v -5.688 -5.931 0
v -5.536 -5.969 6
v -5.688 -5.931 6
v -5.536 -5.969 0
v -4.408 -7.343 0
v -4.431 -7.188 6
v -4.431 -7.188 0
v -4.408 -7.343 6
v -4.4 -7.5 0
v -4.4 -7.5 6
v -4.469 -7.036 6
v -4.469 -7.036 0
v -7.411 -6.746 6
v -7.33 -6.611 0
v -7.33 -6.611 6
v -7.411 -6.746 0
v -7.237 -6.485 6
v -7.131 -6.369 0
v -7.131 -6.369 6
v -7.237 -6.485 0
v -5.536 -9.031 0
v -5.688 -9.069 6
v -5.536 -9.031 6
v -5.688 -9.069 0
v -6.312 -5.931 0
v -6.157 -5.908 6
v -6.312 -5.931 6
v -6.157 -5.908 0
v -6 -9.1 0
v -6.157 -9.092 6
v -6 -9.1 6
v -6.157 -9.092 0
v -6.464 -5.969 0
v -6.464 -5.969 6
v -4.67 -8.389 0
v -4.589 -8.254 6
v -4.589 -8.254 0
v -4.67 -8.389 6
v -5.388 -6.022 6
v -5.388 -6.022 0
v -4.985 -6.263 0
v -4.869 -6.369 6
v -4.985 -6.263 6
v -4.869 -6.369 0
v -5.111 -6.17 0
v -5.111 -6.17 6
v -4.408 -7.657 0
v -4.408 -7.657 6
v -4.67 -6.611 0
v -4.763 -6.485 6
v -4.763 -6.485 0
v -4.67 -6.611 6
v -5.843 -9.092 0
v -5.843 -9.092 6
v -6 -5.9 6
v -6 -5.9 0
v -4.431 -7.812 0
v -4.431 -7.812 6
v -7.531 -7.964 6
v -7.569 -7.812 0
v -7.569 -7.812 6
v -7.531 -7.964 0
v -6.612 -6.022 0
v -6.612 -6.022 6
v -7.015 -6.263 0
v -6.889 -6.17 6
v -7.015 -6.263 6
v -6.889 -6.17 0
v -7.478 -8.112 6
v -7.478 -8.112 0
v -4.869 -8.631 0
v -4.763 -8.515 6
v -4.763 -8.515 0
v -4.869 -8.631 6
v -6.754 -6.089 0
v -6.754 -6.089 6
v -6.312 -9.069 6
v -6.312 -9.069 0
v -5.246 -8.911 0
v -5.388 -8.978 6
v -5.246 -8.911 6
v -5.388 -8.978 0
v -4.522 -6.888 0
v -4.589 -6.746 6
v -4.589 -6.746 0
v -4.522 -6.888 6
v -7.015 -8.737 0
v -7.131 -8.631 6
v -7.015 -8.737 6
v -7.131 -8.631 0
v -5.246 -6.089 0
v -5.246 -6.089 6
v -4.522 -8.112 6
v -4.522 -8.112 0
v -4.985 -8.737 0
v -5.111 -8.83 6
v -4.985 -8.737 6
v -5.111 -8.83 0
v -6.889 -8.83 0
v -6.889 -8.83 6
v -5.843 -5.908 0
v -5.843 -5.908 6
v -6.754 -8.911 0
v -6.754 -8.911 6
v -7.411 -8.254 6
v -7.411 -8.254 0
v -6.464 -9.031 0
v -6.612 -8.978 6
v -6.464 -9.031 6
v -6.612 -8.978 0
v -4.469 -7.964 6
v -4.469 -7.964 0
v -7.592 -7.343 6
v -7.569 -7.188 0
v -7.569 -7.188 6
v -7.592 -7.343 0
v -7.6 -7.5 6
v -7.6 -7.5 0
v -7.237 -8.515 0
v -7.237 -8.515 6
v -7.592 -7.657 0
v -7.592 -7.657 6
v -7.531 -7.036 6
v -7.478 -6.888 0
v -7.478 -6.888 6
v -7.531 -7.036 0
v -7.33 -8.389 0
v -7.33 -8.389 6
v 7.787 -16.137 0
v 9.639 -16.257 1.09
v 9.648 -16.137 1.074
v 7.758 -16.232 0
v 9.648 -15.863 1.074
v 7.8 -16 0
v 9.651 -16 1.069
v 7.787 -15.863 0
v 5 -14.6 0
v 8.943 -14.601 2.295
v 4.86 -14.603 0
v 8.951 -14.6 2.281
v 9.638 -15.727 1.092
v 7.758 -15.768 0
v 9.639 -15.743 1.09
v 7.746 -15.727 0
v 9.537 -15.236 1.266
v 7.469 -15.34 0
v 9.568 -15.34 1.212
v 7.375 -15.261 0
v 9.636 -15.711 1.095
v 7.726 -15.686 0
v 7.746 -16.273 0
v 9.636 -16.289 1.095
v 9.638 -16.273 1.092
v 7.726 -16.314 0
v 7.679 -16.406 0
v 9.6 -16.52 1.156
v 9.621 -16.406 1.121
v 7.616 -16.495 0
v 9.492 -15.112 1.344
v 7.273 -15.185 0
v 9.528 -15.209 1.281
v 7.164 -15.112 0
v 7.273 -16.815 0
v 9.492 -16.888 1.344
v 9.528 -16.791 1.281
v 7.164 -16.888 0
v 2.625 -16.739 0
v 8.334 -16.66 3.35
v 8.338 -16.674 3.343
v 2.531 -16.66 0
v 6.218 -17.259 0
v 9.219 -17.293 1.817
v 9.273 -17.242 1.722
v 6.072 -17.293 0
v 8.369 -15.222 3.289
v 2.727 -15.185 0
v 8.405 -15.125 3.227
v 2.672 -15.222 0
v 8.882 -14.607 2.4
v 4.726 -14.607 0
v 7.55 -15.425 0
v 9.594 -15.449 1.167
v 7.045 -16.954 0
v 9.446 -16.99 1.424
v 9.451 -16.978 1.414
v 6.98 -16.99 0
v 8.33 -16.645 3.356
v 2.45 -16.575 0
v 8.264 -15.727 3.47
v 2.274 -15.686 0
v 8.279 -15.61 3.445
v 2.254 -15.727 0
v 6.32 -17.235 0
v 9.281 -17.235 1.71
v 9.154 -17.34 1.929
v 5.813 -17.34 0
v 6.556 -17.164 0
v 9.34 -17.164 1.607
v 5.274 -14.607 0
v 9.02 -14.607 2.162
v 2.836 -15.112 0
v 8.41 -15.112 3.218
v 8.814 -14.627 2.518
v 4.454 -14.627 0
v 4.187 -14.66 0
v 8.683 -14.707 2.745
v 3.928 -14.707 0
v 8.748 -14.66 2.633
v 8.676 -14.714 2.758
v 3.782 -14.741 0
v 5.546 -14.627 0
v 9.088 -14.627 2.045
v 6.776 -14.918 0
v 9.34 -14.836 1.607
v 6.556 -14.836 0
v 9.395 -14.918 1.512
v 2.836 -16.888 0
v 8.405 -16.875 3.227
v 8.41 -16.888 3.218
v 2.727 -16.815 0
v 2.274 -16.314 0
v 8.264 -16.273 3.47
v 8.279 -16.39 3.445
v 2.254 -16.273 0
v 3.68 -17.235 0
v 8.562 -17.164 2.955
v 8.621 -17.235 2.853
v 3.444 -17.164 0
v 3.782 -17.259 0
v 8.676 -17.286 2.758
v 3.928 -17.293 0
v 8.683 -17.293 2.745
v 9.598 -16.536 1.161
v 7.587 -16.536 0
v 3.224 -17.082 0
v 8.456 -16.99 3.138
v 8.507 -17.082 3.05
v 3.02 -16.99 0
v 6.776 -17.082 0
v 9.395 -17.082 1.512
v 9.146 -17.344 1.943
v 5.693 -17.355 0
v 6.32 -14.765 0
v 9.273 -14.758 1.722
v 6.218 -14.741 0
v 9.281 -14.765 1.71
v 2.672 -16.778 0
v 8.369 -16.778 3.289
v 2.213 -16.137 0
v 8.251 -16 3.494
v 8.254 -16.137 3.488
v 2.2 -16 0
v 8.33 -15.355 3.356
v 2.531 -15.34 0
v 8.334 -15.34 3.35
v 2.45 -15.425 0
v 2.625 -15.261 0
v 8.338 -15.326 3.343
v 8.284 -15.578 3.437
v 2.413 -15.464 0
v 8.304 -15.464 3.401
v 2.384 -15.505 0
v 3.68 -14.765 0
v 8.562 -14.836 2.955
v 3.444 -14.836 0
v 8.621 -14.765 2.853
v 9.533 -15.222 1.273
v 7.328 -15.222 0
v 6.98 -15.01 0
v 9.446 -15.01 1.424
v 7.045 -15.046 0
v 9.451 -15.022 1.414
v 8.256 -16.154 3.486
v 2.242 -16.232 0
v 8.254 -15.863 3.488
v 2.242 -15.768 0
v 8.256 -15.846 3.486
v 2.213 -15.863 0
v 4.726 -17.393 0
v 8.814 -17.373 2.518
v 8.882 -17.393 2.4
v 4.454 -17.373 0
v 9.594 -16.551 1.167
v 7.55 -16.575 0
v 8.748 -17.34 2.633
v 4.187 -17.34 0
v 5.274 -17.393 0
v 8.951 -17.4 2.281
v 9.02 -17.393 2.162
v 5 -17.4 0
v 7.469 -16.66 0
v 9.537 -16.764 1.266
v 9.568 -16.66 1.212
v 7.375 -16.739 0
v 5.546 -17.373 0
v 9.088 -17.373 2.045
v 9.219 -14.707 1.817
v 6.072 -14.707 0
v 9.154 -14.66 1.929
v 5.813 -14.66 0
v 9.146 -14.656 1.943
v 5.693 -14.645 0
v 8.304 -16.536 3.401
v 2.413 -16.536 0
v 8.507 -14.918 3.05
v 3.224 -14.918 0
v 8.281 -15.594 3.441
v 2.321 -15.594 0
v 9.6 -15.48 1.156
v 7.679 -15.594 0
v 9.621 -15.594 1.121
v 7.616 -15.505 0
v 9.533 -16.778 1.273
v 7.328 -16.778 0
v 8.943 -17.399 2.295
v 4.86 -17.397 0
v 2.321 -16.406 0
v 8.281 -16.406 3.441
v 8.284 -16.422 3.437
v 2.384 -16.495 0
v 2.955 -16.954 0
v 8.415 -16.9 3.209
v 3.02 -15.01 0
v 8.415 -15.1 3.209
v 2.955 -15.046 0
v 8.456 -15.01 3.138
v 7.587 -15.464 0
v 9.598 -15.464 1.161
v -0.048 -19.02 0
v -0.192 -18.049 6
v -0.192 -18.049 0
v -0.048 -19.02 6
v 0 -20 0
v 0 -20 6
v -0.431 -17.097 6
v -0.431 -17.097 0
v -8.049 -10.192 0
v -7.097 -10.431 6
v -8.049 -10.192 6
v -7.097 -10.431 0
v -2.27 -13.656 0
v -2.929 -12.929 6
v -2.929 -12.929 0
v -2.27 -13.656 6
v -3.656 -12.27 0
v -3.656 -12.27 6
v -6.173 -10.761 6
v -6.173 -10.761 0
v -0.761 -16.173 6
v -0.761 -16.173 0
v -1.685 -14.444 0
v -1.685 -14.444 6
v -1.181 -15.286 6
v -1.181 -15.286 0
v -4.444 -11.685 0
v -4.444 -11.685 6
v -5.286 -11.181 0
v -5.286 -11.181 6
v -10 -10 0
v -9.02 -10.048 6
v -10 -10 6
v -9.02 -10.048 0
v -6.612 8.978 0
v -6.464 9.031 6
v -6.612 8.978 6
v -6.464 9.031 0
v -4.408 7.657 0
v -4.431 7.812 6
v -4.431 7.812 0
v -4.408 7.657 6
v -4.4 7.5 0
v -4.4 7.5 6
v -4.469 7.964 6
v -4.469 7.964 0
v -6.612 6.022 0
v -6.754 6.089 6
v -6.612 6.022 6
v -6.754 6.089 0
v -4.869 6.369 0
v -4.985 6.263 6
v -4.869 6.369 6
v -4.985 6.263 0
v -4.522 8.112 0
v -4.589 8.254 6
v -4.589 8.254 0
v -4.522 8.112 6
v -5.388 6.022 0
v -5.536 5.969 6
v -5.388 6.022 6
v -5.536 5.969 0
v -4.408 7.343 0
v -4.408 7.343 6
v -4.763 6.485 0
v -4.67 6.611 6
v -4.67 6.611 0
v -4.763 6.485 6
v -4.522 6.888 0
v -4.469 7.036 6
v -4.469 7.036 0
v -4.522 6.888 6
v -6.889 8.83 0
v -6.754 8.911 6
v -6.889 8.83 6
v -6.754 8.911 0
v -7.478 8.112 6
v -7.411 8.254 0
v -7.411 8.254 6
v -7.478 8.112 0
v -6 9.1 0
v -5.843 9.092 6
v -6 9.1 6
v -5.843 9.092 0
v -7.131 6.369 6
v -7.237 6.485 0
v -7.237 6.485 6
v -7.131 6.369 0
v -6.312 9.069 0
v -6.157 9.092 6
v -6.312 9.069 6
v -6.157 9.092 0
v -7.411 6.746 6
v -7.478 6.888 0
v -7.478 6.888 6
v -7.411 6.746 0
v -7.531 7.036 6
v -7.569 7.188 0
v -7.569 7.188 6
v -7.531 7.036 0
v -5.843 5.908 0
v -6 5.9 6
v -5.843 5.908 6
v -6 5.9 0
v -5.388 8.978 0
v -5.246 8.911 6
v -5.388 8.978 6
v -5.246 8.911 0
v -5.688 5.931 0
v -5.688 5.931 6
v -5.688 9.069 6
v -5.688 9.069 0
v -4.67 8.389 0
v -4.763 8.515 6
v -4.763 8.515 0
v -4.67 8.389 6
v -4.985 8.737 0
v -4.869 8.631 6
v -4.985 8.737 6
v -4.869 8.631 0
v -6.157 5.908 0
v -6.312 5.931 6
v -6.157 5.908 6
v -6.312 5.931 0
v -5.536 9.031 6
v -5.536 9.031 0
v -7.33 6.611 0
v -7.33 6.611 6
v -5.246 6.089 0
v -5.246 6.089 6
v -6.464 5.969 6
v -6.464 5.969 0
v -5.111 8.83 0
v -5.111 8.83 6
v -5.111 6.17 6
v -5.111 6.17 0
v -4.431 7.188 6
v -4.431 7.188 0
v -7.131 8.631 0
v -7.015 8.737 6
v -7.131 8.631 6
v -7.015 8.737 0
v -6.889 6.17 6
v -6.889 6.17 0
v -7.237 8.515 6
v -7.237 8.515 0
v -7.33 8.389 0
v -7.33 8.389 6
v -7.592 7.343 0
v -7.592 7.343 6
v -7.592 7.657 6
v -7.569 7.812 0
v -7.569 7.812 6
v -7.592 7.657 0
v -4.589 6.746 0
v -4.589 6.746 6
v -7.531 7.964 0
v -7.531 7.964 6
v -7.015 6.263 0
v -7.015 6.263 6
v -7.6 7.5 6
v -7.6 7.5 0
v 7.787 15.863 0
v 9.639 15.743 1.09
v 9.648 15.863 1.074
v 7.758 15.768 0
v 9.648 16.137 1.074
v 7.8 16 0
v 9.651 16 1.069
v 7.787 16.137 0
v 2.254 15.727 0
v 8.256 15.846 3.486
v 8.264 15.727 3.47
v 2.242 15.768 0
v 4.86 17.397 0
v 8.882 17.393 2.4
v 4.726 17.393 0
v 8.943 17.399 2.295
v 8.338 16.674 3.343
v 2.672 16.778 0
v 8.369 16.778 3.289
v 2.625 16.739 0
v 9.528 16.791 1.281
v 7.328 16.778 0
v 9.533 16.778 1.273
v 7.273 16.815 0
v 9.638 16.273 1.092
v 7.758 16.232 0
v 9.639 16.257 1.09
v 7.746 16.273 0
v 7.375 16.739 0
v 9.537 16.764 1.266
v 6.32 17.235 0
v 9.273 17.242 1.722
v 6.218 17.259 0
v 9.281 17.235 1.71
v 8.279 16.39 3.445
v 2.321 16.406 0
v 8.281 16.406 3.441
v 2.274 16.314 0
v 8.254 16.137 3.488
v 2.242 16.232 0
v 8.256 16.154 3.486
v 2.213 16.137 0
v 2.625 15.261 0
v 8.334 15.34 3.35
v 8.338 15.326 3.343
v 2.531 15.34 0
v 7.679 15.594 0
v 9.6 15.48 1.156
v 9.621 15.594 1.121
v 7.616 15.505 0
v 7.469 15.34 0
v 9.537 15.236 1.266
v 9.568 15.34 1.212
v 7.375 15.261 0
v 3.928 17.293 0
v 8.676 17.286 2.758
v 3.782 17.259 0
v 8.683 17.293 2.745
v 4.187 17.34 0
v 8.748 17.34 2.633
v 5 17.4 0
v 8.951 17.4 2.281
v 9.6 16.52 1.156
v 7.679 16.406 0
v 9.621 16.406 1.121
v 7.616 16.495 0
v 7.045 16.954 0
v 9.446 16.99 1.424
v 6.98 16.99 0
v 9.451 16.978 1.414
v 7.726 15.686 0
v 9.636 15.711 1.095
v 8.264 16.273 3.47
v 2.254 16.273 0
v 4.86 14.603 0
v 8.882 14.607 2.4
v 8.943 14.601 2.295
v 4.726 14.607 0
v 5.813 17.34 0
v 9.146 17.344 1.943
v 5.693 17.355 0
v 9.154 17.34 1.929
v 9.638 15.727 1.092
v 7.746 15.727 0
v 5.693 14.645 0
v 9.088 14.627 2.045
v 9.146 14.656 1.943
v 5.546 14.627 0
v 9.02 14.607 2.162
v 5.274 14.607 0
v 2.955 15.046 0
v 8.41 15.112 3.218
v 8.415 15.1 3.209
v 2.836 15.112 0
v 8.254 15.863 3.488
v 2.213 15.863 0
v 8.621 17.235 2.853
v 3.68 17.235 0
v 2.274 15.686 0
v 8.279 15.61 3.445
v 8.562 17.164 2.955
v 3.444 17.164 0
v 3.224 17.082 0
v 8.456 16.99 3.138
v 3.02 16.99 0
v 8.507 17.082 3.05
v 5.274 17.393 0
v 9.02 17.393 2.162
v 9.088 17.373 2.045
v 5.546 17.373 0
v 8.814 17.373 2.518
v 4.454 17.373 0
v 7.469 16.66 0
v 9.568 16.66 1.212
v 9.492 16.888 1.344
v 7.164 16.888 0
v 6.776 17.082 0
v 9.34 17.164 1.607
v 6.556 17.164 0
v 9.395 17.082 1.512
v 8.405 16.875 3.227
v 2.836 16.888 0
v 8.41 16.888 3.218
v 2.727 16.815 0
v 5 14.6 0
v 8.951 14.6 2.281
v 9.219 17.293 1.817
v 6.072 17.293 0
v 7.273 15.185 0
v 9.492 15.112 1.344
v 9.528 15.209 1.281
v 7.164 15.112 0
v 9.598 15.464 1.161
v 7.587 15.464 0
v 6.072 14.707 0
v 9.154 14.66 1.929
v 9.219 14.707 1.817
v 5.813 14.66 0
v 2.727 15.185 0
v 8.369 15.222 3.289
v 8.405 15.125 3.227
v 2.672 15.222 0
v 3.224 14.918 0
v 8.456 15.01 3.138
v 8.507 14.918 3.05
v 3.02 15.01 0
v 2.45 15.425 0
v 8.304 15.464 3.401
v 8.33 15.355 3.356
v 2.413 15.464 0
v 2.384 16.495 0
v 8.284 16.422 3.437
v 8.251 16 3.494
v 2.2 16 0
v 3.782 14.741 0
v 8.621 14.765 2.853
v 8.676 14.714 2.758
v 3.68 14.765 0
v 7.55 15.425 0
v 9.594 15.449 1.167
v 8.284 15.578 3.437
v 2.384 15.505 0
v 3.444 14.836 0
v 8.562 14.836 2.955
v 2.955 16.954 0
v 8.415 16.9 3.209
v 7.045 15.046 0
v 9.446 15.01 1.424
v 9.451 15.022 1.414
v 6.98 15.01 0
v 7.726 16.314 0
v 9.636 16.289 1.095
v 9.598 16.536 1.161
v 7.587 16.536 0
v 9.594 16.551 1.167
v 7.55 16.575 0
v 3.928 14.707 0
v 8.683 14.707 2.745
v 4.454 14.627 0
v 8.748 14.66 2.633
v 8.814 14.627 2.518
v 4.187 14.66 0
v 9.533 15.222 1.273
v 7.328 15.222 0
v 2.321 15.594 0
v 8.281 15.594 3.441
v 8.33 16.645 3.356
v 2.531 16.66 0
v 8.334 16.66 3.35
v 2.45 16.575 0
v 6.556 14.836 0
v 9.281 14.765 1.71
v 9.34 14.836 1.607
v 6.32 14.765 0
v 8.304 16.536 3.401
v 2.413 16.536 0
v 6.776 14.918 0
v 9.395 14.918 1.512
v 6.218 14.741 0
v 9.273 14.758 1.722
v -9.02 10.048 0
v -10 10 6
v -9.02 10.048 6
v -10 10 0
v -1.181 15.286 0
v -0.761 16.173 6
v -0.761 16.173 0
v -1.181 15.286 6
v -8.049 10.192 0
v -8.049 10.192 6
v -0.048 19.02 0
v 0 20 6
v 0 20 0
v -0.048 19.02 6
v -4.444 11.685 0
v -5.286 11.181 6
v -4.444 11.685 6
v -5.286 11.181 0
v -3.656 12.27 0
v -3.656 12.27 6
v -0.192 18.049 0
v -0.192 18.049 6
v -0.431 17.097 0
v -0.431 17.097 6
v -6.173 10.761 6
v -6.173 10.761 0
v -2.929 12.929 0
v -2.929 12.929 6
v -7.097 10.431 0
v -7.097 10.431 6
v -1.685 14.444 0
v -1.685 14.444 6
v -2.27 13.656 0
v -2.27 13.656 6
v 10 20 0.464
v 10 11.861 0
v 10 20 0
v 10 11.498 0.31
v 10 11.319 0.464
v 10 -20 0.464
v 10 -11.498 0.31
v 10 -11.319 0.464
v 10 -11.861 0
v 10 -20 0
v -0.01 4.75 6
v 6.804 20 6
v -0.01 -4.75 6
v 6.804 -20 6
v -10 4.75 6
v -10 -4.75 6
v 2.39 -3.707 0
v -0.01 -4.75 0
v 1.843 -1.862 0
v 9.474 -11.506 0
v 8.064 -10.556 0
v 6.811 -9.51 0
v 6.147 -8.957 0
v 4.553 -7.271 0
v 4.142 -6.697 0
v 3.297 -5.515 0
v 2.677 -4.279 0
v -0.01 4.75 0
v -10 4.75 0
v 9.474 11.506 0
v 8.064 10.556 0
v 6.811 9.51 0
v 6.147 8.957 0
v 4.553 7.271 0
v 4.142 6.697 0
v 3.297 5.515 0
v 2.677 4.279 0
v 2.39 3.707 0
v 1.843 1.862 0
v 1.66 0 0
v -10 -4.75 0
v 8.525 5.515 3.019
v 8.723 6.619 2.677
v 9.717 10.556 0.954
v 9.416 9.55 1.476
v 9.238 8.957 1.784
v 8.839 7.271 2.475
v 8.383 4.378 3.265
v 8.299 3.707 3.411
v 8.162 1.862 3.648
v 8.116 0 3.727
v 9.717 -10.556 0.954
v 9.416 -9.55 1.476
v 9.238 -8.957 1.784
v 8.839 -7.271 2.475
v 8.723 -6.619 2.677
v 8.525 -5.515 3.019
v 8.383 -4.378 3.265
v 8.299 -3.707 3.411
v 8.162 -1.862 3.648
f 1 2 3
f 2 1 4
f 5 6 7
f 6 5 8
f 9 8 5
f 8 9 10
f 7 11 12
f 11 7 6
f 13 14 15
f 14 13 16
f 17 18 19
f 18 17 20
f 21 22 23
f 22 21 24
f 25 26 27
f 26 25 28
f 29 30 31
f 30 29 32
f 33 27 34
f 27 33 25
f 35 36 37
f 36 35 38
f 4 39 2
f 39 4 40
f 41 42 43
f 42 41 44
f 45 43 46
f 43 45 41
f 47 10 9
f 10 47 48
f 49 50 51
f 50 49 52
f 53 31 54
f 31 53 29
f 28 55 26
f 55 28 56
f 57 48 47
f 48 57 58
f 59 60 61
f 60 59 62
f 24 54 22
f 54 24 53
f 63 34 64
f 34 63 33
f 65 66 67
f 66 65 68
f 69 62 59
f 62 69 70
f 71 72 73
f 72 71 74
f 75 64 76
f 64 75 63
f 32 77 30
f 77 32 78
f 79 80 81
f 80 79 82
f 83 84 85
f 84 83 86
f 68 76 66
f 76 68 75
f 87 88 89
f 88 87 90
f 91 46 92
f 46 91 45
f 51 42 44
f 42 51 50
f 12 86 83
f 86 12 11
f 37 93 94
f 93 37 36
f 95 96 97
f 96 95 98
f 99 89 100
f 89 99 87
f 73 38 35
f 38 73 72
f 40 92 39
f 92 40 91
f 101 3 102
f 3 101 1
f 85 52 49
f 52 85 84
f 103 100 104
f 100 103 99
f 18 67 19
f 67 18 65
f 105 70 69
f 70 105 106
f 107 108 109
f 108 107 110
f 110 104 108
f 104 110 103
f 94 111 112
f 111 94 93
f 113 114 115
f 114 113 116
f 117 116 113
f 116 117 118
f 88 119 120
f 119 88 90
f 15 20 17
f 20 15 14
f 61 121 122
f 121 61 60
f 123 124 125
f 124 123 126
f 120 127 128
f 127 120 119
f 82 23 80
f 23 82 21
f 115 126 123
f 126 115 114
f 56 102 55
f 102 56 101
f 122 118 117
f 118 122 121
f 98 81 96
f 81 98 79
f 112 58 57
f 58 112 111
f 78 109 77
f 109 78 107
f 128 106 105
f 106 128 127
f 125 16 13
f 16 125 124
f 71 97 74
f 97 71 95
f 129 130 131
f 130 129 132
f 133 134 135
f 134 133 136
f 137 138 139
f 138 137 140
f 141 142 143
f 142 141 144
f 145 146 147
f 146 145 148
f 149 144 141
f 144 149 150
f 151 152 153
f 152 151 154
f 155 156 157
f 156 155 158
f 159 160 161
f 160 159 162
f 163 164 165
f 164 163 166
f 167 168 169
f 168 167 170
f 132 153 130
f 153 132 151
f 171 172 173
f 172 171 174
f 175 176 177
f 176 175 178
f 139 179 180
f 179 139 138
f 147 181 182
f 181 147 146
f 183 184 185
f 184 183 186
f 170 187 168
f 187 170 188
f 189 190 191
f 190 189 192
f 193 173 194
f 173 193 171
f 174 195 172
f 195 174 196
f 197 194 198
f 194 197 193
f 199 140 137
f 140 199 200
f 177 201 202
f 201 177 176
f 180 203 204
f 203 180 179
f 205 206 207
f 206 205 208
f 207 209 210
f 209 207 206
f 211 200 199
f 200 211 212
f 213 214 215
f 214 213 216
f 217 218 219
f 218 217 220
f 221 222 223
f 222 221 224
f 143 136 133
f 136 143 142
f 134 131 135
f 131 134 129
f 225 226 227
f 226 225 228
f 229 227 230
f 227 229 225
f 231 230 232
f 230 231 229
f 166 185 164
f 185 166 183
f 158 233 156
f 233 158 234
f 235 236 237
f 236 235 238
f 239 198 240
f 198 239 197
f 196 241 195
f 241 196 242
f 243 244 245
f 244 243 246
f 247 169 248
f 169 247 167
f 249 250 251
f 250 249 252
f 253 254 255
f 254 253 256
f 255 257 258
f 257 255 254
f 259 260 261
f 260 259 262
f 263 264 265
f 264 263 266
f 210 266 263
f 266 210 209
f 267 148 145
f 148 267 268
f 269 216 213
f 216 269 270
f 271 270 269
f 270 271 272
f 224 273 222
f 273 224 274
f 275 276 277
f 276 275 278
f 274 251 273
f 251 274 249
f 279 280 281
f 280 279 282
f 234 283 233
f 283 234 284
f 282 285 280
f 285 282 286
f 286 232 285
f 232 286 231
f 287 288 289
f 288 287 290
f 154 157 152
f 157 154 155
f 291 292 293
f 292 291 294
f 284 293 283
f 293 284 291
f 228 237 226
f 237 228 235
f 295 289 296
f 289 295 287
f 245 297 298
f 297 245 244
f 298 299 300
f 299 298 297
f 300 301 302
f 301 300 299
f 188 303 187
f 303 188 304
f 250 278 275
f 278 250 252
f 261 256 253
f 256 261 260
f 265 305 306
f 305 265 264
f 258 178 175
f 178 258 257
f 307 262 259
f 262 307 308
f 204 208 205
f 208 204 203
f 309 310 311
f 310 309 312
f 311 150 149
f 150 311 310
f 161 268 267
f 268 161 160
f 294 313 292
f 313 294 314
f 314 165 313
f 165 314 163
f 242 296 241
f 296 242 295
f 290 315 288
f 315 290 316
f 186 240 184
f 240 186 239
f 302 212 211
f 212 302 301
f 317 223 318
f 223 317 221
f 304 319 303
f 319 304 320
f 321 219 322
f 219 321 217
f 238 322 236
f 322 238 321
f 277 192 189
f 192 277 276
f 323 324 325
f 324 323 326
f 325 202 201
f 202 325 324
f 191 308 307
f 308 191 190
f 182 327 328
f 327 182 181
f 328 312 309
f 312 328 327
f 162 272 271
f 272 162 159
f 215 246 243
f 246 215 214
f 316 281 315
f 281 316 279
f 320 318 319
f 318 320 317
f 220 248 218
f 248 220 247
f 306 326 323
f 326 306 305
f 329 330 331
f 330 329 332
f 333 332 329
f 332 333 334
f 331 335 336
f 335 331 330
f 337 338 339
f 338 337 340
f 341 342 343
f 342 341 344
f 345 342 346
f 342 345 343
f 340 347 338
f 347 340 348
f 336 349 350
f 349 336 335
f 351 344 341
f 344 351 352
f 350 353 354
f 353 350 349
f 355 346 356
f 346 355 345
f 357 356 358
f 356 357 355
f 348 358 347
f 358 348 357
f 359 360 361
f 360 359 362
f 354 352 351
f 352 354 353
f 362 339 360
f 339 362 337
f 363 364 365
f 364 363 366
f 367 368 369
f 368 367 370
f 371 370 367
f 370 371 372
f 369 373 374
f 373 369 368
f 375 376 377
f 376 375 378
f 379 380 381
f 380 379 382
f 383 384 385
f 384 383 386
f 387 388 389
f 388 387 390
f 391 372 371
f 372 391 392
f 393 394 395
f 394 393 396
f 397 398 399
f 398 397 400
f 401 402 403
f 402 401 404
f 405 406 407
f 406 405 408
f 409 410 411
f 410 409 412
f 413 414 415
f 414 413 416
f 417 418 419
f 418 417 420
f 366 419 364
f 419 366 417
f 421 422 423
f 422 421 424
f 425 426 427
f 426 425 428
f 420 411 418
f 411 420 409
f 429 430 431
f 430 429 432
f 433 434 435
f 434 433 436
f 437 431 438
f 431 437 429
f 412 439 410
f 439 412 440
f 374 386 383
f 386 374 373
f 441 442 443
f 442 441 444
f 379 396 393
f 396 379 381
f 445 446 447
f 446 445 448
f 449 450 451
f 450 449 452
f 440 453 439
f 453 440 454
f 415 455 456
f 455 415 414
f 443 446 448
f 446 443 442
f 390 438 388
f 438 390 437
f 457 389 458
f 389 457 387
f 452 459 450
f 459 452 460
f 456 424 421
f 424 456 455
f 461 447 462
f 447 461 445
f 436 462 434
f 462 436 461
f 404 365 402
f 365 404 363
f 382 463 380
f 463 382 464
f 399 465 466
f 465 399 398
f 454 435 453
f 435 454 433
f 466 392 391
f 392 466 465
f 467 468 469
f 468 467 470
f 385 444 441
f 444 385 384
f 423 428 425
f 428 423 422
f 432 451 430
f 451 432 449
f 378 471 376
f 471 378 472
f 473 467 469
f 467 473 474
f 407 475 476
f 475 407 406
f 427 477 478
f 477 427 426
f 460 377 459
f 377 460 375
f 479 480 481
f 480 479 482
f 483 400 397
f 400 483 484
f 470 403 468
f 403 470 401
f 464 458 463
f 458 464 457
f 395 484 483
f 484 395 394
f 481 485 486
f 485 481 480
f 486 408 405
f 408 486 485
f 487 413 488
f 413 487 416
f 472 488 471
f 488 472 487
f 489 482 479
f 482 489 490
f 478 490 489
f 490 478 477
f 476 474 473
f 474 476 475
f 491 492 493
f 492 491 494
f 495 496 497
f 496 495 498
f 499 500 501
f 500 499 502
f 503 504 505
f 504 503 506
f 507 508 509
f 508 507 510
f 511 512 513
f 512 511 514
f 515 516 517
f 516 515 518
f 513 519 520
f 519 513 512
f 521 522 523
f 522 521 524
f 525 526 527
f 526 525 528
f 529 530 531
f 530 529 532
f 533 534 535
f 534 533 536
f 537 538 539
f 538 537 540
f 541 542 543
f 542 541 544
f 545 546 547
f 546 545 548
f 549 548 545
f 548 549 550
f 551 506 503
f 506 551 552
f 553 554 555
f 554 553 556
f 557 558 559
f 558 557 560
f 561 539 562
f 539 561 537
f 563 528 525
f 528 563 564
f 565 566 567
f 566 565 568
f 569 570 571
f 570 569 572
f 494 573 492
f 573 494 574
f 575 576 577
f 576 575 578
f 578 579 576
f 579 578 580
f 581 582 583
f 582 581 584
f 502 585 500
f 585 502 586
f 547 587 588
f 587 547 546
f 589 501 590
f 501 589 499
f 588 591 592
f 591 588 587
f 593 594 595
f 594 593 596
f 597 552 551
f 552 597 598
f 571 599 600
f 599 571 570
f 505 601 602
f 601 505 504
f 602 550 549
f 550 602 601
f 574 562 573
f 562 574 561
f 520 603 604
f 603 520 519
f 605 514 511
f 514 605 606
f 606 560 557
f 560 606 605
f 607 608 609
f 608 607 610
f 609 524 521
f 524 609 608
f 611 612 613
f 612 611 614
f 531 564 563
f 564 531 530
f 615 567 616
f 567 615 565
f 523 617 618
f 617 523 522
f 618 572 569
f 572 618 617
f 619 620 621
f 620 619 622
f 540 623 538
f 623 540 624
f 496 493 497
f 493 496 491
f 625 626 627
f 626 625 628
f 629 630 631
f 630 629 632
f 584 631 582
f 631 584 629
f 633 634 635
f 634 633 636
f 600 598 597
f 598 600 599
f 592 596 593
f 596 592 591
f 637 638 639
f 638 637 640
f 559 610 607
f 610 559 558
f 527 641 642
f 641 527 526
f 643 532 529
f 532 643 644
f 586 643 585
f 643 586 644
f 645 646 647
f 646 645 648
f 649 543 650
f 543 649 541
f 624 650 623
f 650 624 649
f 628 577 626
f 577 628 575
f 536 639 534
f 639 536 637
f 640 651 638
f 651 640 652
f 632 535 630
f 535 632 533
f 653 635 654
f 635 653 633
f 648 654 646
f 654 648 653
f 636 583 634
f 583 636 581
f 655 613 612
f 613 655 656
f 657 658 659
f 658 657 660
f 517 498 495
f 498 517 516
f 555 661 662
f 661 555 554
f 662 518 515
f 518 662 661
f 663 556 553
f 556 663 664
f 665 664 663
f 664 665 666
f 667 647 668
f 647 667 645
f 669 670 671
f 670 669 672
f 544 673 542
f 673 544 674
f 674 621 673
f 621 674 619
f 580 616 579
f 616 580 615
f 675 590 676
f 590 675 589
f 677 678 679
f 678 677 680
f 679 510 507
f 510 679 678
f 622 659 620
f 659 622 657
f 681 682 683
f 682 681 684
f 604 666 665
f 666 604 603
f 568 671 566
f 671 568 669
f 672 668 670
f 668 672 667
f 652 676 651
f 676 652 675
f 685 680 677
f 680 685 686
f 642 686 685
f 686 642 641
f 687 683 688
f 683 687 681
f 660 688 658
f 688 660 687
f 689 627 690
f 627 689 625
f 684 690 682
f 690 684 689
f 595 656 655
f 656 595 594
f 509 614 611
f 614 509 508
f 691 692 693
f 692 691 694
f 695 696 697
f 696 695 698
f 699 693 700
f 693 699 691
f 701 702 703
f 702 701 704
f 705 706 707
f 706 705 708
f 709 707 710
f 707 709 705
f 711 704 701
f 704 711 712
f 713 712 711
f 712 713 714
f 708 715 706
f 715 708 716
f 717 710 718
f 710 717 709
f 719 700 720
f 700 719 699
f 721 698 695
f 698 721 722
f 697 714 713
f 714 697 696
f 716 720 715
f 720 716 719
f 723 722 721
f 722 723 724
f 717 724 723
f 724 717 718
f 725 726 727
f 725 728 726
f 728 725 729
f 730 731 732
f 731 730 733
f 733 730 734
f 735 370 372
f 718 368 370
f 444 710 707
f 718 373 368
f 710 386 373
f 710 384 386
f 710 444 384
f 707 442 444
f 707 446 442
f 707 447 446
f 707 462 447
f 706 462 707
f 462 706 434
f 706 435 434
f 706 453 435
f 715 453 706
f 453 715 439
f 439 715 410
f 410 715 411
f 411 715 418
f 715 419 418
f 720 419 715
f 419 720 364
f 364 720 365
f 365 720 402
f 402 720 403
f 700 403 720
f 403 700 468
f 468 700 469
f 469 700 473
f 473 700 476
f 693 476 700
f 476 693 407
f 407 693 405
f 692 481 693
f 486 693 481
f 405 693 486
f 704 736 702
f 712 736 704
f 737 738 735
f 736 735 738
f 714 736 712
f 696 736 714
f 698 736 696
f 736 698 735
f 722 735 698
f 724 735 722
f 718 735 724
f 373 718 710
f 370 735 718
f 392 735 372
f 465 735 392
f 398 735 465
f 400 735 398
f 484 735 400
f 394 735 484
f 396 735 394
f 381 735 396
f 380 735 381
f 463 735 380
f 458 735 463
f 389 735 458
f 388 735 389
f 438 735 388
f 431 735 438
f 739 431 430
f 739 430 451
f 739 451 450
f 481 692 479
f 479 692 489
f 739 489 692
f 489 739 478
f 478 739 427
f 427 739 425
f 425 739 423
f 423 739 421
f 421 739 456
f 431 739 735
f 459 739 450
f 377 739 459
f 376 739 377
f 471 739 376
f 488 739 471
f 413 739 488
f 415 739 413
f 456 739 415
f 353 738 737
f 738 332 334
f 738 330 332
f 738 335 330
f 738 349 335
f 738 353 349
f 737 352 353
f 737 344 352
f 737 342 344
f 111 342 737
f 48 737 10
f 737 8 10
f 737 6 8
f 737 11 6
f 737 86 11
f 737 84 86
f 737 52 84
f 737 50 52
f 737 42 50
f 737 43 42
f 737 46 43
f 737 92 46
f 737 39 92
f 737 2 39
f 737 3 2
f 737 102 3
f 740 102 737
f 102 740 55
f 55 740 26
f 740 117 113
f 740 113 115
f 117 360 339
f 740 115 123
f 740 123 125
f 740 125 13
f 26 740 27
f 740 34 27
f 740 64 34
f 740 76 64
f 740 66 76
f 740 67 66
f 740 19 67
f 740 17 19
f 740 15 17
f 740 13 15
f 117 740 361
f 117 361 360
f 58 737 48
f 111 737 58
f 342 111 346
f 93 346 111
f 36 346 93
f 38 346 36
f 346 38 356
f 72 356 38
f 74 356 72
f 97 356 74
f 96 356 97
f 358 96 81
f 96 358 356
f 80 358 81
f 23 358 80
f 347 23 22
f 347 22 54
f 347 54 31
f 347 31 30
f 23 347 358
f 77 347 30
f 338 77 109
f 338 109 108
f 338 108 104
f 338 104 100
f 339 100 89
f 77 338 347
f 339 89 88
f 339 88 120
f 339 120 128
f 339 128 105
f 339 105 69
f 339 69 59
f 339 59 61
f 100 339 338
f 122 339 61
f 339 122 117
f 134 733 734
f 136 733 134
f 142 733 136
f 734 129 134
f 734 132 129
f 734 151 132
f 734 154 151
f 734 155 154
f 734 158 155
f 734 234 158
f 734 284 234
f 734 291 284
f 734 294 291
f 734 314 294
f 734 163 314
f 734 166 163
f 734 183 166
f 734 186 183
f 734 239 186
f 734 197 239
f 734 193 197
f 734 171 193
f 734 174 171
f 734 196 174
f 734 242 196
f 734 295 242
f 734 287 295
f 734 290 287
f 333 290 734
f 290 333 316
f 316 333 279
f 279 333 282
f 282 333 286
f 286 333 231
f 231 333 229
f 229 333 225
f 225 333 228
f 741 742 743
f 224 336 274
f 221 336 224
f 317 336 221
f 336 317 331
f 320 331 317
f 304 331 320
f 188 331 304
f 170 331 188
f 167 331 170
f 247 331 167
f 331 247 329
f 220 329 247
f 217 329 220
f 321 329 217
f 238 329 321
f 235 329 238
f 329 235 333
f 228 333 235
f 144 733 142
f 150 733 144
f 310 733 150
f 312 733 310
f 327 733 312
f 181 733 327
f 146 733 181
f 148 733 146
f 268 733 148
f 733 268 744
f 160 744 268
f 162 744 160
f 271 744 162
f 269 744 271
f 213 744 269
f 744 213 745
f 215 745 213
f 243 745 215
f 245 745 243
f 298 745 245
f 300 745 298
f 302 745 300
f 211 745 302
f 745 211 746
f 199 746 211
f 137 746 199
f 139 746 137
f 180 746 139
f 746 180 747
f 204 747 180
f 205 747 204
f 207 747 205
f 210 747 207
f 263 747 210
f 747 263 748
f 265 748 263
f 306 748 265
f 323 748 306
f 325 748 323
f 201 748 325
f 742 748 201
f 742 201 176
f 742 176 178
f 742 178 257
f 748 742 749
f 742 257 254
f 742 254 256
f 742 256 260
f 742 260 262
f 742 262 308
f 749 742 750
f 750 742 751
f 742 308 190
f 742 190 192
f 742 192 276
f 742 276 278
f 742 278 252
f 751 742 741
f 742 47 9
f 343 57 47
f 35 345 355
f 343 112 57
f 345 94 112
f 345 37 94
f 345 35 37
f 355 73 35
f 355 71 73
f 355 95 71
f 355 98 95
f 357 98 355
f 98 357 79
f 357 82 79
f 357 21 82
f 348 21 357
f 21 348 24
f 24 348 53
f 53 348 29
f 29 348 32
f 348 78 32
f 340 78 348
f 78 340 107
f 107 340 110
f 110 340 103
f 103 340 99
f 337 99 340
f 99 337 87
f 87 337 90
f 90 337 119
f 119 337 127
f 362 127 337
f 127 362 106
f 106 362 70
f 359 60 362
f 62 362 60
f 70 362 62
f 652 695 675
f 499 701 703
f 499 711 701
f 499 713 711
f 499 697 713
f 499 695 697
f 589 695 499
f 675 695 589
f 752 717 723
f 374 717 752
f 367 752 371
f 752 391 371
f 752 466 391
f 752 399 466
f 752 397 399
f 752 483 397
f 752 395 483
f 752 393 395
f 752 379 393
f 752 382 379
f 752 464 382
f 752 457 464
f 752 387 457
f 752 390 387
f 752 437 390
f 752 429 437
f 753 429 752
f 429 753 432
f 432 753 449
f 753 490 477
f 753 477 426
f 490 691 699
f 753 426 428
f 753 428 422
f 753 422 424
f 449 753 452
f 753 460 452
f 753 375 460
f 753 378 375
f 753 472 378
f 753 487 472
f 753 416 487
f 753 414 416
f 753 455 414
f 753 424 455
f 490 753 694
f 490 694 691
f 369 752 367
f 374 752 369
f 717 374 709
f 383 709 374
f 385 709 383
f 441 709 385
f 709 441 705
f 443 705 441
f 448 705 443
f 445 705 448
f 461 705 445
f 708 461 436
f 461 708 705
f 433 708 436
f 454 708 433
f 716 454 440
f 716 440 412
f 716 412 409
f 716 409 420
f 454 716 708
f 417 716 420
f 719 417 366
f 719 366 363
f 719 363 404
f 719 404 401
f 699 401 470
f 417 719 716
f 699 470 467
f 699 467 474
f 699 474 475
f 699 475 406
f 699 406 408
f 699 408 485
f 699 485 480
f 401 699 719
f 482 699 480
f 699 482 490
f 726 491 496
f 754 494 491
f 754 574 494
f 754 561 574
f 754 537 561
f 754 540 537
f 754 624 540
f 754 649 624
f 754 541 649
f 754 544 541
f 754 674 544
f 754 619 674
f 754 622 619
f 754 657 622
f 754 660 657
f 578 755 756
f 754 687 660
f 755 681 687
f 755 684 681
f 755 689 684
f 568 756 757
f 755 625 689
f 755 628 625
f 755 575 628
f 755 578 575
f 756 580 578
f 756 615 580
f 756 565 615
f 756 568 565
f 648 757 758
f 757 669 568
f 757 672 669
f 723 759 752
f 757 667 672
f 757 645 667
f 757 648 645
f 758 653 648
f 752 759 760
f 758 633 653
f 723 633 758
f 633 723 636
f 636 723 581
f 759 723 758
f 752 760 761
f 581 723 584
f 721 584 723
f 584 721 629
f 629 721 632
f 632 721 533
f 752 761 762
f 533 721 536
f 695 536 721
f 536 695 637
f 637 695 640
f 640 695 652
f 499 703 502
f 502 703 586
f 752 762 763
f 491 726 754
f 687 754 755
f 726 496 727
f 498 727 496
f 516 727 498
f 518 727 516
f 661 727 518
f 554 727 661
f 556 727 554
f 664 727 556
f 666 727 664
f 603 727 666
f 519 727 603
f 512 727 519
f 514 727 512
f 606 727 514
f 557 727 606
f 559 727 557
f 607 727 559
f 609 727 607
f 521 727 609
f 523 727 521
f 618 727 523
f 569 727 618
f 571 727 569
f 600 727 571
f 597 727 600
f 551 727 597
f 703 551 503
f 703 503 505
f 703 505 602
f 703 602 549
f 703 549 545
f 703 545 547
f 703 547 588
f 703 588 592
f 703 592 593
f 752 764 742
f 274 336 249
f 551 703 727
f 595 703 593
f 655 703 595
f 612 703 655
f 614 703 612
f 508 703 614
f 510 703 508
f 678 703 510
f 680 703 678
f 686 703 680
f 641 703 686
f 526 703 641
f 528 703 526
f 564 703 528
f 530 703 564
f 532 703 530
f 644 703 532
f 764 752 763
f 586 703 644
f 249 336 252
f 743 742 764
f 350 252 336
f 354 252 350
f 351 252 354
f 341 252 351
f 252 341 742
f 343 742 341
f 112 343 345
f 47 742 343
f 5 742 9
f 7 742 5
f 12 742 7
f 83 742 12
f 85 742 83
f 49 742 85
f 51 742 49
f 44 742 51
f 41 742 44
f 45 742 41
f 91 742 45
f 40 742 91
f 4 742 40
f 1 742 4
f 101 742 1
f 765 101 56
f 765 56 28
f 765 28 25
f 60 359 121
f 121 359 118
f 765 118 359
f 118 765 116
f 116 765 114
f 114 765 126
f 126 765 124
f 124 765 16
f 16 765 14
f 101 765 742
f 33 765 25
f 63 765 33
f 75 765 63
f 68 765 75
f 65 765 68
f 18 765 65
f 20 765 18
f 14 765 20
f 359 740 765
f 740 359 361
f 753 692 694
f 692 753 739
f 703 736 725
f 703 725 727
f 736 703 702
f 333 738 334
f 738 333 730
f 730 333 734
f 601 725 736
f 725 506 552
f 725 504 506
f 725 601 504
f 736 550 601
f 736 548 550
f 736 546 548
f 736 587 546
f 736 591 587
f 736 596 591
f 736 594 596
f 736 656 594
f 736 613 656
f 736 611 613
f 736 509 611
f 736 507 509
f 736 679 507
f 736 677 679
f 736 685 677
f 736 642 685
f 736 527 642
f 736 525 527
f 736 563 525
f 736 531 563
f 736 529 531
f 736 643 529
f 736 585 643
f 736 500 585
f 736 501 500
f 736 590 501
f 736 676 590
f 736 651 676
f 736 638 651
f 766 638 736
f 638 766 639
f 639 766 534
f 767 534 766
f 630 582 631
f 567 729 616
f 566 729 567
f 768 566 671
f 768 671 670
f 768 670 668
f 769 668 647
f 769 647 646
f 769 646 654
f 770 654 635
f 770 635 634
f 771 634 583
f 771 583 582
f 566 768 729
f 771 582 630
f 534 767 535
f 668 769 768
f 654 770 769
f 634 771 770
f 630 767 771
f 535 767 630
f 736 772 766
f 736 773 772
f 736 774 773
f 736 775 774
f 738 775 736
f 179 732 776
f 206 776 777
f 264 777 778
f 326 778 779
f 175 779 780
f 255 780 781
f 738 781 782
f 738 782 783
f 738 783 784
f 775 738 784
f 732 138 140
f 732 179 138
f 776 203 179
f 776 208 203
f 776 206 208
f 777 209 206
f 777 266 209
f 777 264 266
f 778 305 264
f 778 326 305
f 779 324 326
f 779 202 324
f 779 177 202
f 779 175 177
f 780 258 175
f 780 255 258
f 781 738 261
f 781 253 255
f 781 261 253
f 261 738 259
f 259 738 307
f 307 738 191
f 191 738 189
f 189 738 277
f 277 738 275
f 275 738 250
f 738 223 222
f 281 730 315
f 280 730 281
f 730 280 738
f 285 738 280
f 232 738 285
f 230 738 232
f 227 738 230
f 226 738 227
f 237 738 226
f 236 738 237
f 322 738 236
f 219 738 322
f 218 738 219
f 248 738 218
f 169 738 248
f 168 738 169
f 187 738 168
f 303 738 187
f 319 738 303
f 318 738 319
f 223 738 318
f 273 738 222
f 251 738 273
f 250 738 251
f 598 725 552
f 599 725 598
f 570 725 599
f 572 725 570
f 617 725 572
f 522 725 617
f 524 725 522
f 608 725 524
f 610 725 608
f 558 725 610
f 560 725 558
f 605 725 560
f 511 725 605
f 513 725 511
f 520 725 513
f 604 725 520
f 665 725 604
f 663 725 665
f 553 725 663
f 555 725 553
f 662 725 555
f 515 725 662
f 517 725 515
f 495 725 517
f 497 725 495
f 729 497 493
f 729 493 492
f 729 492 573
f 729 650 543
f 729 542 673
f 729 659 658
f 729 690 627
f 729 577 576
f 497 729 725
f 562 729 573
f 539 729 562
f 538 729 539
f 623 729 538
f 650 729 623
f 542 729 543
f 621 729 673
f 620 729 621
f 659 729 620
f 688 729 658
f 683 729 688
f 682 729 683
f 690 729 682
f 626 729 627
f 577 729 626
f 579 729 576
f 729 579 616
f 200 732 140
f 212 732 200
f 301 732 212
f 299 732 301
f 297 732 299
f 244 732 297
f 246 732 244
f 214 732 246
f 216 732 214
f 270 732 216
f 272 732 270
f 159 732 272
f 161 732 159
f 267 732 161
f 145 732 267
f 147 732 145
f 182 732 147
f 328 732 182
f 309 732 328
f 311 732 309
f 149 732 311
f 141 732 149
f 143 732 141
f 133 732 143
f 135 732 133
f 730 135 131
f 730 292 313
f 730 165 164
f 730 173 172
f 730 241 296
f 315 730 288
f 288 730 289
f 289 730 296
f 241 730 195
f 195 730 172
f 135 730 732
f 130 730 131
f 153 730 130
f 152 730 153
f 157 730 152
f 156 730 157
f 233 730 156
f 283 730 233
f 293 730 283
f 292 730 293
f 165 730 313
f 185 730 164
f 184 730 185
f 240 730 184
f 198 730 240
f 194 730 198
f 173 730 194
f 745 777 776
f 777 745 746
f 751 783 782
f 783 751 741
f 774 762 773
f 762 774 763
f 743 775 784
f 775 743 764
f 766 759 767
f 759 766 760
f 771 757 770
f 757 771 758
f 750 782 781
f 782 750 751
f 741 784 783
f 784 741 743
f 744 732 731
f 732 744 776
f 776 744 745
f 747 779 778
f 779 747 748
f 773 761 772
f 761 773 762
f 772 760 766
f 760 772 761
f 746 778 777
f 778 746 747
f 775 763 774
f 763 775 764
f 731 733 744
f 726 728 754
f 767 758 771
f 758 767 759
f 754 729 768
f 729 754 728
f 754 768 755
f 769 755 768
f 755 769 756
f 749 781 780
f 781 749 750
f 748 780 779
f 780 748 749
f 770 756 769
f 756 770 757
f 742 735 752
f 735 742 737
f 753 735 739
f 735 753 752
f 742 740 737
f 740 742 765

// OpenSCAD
width=40;
thick=6;
depth=20;
angle=60;

module bracket() {
  translate([0,0,thick/2]) difference() {
    cube([depth,width,thick],center=true);
    translate([depth/2+2,0,0]) rotate([0,angle,0]) cube([depth*2,width*1.1,thick],center=true);
    //mounting holes
    for(i=[-1,1]) {
      translate([-6,i*7.5,0]) cylinder(r=3.2/2,h=thick*2,center=true,$fn=64);
      #translate([5,i*16,-3]) rotate([0,angle,0]) cylinder(r=2.8/2,h=thick*2,center=true,$fn=64);
      translate([-depth/2,i*20,0]) cylinder(r=depth/2,h=thick*4,center=true,$fn=64);
    }
    translate([38/2+12,0,-8]) rotate([0,angle,0]) cylinder(r=38/2,h=thick*20,center=true,$fn=64);
    translate([-depth/4-0.01,0,0]) cube([depth/2,9.5,thick*1.1],center=true);
  }
}

//translate([0,0,thick]) mirror([0,0,1])
  bracket();
